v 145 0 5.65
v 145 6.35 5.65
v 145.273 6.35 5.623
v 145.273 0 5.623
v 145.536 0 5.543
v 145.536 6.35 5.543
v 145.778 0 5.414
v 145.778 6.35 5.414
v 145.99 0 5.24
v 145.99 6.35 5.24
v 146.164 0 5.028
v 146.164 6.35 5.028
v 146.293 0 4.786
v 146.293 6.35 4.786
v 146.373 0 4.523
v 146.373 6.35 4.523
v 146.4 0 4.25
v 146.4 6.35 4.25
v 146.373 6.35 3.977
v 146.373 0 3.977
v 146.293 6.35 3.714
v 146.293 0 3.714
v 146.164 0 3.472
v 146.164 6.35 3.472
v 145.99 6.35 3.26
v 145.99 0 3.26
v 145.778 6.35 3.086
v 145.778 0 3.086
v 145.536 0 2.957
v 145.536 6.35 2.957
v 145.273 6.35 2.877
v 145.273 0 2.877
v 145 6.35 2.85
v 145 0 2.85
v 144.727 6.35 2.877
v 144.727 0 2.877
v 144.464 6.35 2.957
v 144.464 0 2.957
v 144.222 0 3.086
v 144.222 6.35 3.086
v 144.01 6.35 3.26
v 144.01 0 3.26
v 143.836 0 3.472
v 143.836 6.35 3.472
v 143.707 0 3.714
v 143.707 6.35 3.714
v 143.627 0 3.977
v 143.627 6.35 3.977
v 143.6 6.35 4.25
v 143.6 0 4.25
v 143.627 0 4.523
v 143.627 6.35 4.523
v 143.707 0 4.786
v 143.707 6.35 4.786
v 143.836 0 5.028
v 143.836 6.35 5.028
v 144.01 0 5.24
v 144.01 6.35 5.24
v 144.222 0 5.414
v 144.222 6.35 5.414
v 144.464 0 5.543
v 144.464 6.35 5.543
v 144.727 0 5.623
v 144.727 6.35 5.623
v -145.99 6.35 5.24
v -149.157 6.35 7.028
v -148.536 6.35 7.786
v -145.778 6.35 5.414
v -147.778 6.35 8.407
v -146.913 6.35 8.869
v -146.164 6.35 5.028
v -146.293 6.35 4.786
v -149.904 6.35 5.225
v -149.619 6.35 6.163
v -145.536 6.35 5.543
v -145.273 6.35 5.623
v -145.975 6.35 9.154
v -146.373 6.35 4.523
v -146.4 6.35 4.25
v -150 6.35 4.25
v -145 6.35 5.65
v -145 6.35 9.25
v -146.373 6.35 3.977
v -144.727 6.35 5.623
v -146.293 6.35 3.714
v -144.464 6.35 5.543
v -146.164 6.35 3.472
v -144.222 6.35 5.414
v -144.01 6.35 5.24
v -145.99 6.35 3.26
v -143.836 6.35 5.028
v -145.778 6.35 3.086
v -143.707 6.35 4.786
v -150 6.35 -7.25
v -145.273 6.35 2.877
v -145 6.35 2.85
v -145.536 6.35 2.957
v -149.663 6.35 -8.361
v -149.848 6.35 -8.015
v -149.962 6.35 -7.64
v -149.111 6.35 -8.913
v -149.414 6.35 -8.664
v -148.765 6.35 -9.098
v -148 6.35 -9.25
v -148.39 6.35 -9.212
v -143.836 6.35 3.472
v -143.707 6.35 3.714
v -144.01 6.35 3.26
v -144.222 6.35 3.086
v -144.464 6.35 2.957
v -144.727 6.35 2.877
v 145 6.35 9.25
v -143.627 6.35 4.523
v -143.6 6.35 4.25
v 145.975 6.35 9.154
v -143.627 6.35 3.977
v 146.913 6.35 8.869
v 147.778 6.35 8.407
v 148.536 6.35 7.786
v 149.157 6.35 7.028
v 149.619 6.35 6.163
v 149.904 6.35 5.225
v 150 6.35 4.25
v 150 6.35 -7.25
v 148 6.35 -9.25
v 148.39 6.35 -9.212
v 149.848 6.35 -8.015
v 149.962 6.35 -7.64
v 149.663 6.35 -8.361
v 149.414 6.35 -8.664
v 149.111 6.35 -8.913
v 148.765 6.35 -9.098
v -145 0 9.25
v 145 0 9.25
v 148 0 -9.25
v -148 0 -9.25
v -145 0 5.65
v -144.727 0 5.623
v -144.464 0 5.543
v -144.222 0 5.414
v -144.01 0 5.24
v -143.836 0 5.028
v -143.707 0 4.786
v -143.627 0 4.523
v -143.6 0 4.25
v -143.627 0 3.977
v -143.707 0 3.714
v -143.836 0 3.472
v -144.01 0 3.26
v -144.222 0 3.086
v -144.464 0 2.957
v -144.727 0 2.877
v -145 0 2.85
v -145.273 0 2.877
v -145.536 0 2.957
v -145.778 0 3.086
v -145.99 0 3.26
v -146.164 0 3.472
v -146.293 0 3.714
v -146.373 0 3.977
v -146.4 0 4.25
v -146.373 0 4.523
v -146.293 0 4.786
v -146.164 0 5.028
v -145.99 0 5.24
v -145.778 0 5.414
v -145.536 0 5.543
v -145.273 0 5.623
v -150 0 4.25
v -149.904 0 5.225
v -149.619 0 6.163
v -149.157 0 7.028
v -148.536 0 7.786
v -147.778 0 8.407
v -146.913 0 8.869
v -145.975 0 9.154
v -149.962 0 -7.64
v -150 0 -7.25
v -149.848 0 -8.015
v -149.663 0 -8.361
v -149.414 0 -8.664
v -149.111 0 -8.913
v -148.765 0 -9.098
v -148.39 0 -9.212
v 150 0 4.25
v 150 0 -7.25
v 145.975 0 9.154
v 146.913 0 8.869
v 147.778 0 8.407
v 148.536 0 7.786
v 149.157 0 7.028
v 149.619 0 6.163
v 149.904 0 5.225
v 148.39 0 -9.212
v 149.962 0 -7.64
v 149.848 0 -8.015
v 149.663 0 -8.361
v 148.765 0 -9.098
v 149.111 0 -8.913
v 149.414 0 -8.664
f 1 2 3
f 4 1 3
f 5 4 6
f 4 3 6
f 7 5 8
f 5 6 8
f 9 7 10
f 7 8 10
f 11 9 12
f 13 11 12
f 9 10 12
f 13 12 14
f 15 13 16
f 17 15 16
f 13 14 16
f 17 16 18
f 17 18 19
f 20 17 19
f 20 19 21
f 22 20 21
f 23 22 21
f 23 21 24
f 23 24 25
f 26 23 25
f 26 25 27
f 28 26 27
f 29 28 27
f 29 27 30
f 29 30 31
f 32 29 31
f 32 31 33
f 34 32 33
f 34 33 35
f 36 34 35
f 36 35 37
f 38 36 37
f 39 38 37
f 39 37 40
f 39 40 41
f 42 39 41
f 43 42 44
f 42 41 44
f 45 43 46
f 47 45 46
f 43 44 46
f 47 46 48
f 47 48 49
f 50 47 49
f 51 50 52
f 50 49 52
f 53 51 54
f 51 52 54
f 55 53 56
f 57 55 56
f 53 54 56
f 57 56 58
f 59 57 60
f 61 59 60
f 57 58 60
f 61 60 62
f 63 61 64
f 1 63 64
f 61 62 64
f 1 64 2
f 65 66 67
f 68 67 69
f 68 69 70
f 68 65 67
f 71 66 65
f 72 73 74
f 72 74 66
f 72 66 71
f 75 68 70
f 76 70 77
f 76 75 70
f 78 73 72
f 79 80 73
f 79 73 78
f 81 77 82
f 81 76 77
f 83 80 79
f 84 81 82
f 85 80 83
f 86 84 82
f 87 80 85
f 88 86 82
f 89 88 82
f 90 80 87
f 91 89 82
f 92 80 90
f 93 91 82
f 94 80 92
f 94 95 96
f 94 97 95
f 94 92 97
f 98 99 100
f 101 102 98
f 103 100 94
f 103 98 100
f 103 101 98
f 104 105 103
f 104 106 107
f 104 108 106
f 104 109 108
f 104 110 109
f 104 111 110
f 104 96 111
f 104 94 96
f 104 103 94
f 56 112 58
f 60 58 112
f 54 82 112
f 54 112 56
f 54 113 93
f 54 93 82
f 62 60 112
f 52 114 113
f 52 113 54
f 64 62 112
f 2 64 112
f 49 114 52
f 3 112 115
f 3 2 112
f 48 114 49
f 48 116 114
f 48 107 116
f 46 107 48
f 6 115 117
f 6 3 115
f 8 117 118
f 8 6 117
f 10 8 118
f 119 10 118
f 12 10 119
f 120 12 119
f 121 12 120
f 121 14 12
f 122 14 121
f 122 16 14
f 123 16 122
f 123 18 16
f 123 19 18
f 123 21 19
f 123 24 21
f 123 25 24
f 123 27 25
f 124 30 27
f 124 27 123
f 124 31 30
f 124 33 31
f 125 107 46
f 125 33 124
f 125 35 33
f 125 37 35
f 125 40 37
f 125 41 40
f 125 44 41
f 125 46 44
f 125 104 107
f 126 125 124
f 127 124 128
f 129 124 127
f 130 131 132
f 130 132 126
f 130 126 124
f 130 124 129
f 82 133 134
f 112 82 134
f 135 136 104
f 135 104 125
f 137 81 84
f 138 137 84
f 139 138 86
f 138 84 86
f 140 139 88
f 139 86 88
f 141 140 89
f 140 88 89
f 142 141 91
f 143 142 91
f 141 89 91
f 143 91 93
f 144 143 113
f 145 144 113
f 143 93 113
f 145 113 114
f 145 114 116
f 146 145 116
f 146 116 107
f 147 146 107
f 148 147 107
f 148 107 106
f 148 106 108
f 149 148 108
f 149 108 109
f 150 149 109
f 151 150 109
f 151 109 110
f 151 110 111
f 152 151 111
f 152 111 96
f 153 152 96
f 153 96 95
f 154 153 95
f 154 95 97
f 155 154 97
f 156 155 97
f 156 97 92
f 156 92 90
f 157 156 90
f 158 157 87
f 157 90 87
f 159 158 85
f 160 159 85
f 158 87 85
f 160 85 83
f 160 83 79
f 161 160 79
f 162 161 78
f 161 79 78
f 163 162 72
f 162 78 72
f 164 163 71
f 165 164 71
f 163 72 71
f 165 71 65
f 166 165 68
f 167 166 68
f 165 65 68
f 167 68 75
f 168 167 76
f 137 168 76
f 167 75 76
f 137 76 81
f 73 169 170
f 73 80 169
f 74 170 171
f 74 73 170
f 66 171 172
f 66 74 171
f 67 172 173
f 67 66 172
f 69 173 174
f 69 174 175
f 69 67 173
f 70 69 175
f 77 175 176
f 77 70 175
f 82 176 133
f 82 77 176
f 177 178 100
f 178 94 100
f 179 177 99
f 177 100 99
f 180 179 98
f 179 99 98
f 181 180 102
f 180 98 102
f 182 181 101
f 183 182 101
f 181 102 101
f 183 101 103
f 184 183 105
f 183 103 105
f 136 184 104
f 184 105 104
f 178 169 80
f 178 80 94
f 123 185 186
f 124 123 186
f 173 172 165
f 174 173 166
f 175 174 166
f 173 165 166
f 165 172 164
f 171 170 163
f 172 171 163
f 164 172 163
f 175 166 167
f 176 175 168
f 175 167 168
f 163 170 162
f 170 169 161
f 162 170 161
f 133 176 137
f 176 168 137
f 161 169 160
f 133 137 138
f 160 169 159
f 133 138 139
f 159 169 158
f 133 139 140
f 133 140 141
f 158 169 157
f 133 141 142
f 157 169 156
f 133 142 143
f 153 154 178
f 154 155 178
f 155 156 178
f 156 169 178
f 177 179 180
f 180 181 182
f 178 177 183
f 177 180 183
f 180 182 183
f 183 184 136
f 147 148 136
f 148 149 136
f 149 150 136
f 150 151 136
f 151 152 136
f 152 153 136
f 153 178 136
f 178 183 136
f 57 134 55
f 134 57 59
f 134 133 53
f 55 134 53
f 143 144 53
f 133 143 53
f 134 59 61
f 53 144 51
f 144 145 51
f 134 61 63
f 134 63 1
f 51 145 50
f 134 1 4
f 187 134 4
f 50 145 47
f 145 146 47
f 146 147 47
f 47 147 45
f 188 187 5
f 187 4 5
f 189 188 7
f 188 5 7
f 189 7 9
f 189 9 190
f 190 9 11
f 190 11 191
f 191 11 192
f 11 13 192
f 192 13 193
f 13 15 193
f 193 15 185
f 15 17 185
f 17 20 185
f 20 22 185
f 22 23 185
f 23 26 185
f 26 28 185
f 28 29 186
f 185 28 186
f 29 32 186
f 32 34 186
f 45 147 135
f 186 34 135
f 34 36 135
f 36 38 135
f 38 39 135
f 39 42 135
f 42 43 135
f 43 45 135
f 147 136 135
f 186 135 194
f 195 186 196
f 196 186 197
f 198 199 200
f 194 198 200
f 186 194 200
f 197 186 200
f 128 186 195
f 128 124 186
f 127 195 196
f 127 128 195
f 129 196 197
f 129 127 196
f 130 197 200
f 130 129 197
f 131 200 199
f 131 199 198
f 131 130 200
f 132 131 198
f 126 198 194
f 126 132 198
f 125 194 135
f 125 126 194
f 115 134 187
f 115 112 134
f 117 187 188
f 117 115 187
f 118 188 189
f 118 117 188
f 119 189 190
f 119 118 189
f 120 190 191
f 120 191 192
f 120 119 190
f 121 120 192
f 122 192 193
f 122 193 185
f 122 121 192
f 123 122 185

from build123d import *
from OCP.BRepFilletAPI import BRepFilletAPI_MakeFillet

# Parameters (mm, degrees)
SKETCH1_W           = 300
SKETCH1_H           = 18.5
BOSS_EXTRUDE1_DEPTH = 6.35
FILLET1_R1          = 5
FILLET1_R2          = 2
SKETCH2_R           = 1.4
CUT_EXTRUDE1_DEPTH  = 151.419031376


with BuildPart() as part:
    # Sketch1 → Boss-Extrude1 (new body)
    with BuildSketch(Plane(origin=(0, 0, 0), x_dir=(1, 0, 0), z_dir=(0, 1, 0))):
        Rectangle(SKETCH1_W, SKETCH1_H)
    extrude(amount=BOSS_EXTRUDE1_DEPTH)

    # Fillet1: one fillet with a radius per group of edges: ONE call of the kernel's fillet builder (fillet() takes one radius for all edges)
    fillet1_edges_1 = [part.edges().sort_by_distance(p)[0] for p in [
        (-150, 3.175, 9.25),
        (150, 3.175, 9.25),
    ]]
    fillet1_edges_2 = [part.edges().sort_by_distance(p)[0] for p in [
        (-150, 3.175, -9.25),
        (150, 3.175, -9.25),
    ]]
    fillet1 = BRepFilletAPI_MakeFillet(part.part.solid().wrapped)
    for e in fillet1_edges_1:
        fillet1.Add(FILLET1_R1, e.wrapped)
    for e in fillet1_edges_2:
        fillet1.Add(FILLET1_R2, e.wrapped)
    add(Compound.cast(fillet1.Shape()), mode=Mode.REPLACE)

    # Sketch2 → Cut-Extrude1 (cut, through all)
    with BuildSketch(Plane(origin=(0, 6.35, 0), x_dir=(1, 0, 0), z_dir=(0, 1, 0))):
        with Locations((-145, -4.25)):
            Circle(SKETCH2_R)
        with Locations((145, -4.25)):
            Circle(SKETCH2_R)
    extrude(amount=-CUT_EXTRUDE1_DEPTH, mode=Mode.SUBTRACT)


solid = part.part
